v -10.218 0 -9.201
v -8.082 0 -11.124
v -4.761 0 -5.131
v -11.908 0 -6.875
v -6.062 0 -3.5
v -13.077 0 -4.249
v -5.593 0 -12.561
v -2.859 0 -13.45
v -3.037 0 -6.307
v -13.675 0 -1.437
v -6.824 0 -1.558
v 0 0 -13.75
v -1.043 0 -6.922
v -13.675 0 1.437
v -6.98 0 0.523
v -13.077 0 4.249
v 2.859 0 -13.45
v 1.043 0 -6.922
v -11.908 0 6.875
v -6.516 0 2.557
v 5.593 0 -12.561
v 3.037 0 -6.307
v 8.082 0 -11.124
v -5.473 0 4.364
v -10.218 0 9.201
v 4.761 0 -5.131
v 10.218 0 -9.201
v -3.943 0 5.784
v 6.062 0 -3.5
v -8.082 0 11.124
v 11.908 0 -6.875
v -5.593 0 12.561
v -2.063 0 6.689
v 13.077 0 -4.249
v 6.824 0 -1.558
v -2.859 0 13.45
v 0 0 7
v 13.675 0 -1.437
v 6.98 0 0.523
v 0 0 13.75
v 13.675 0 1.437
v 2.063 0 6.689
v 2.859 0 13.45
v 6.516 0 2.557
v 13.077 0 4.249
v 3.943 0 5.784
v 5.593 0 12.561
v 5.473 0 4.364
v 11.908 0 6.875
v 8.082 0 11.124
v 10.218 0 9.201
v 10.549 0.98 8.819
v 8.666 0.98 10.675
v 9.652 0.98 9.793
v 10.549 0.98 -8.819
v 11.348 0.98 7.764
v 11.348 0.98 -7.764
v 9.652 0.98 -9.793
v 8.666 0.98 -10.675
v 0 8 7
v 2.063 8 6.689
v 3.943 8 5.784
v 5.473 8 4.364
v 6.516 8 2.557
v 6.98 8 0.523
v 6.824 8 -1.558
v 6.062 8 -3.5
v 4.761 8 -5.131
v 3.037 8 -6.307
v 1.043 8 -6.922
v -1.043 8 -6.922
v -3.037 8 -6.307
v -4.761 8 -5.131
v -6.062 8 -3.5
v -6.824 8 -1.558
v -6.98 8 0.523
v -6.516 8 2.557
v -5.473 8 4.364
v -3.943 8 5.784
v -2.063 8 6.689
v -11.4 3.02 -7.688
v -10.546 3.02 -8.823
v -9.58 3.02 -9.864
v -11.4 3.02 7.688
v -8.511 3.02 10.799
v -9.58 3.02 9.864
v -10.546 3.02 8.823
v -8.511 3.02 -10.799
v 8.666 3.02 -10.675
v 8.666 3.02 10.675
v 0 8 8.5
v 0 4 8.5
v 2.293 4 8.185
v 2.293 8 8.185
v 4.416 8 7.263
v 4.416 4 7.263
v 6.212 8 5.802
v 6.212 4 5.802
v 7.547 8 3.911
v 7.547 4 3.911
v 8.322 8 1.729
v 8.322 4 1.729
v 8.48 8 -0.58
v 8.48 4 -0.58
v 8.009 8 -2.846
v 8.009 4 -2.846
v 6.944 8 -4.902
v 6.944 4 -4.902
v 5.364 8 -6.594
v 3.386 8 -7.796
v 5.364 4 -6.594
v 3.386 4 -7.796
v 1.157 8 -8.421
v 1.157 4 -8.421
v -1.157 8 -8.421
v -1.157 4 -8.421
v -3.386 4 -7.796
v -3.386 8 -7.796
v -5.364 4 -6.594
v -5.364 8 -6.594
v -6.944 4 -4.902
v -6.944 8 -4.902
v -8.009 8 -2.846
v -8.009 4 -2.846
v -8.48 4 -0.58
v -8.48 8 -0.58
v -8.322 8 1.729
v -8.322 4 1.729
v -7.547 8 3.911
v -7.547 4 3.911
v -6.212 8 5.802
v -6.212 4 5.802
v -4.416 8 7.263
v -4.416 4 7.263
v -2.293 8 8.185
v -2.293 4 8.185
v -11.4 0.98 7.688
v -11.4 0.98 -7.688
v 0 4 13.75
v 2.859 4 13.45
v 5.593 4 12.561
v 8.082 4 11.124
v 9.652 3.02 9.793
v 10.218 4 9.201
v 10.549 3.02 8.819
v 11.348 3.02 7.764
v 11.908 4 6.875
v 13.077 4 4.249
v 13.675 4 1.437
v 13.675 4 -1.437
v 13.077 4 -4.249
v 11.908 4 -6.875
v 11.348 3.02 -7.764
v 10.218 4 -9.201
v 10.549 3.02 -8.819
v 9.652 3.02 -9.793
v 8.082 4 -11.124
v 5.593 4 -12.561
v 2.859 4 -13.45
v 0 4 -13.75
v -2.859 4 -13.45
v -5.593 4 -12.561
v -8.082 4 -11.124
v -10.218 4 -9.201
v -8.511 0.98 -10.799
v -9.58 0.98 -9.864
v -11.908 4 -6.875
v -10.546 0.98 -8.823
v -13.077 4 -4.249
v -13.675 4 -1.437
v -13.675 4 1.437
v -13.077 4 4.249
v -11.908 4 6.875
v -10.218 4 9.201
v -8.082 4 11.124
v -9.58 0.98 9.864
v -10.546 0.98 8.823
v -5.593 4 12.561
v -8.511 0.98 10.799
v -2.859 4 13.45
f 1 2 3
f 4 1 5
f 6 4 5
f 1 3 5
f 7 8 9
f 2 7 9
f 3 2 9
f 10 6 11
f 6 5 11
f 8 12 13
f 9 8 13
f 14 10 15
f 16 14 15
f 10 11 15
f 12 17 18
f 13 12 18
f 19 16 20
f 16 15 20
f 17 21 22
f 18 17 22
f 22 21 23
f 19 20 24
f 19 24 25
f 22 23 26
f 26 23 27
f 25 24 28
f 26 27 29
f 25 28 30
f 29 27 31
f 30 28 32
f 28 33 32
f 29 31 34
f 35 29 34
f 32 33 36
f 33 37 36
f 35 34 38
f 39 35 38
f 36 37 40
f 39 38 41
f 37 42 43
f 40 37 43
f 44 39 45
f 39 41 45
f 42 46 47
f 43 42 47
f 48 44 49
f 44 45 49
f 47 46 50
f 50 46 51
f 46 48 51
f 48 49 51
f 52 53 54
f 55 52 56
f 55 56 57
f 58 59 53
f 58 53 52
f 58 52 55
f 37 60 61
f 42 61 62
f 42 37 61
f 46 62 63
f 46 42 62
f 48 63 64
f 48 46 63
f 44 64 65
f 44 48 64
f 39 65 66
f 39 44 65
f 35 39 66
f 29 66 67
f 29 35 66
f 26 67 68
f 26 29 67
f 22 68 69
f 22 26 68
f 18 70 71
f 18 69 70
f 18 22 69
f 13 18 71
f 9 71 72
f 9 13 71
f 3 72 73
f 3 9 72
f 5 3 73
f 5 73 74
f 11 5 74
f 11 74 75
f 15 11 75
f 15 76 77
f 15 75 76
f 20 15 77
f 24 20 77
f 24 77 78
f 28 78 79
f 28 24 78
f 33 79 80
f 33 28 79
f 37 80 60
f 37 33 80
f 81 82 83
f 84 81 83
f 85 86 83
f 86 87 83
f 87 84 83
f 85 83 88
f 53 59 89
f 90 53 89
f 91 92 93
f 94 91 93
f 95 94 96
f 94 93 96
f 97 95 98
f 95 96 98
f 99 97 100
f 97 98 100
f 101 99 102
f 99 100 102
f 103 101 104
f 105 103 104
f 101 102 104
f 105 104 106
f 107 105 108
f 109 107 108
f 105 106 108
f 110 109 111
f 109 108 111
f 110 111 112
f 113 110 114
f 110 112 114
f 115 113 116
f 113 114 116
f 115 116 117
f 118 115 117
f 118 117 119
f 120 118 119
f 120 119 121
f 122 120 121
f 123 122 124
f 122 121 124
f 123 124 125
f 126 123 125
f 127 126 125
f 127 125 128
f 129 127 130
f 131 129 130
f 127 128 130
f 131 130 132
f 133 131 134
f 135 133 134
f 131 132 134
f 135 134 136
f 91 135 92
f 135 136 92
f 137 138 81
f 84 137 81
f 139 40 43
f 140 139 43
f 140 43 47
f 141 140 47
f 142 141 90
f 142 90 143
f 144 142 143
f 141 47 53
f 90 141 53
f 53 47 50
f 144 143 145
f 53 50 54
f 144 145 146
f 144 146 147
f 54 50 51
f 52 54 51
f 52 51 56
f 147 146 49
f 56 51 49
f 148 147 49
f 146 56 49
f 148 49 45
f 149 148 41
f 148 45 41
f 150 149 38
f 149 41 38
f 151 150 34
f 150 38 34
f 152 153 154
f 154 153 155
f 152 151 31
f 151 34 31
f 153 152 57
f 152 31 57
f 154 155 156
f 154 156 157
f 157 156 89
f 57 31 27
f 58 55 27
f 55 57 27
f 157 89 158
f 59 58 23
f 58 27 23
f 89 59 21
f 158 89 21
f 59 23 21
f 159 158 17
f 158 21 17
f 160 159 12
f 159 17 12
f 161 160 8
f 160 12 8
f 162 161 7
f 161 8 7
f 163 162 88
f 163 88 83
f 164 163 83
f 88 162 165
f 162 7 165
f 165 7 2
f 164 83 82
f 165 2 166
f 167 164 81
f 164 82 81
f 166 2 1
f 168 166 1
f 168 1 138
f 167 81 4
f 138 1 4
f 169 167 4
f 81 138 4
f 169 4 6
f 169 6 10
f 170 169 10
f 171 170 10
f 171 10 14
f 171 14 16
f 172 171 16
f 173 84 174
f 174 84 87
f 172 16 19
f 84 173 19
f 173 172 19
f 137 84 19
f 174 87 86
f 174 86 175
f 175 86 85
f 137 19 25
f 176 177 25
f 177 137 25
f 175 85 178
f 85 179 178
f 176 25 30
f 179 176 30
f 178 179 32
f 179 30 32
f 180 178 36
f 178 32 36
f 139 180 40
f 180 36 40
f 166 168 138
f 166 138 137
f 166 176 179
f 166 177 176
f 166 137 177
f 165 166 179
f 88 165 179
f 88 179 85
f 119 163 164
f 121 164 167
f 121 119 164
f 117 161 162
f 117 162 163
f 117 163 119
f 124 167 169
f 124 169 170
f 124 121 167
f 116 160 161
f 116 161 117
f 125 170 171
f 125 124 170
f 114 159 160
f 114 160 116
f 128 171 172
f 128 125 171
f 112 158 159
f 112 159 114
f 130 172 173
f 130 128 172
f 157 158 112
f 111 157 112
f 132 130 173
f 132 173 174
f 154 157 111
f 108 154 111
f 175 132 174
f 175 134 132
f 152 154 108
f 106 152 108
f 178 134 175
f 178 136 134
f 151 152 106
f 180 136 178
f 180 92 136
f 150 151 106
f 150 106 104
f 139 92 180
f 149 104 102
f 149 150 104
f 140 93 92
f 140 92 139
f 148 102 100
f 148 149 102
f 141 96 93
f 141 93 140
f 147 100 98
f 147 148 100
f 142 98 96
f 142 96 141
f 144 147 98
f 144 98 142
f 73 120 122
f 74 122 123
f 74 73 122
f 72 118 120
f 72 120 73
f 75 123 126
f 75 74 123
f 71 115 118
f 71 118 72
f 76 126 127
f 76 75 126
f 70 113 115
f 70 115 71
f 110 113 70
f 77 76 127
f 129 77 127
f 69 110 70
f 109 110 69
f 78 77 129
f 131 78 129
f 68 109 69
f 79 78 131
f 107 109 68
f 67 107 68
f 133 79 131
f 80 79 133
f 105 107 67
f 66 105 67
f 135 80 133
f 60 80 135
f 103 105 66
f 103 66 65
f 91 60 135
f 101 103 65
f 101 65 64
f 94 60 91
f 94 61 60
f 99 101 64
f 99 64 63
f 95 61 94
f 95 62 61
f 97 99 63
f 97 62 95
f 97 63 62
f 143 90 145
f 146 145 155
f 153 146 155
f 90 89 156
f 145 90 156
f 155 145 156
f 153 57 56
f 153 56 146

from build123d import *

# Parameters (mm, degrees)
SKETCH1_R               = 13.75
BOSS_EXTRUDE1_DEPTH     = 4
BOSS_EXTRUDE2_START     = 4
SKETCH5_R               = 8.5
BOSS_EXTRUDE2_DEPTH     = 4
CUT_EXTRUDE1_DEPTH      = 22.026768653
CUT_EXTRUDE1_DEPTH_BACK = 22.026768653
SKETCH6_W               = 2.888681075
SKETCH6_H               = 2.039823556
SKETCH6_W_2             = 2.682346713
SKETCH8_R               = 7
CUT_EXTRUDE3_DEPTH      = 12


with BuildPart() as part:
    # Sketch1 → Boss-Extrude1 (new body)
    with BuildSketch(Plane(origin=(0, 0, 0), x_dir=(1, 0, 0), z_dir=(0, 1, 0))):
        with Locations(Location((0, 0, 0), (0, 0, 270))):
            Circle(SKETCH1_R)
    extrude(amount=BOSS_EXTRUDE1_DEPTH)

    # Sketch5 → Boss-Extrude2 (add)
    with BuildSketch(Plane(origin=(0, 0, 0), x_dir=(1, 0, 0), z_dir=(0, 1, 0)).offset(BOSS_EXTRUDE2_START)):
        with Locations(Location((0, 0, 0), (0, 0, 270))):
            Circle(SKETCH5_R)
    extrude(amount=BOSS_EXTRUDE2_DEPTH)

    # Sketch6 → Cut-Extrude1 (cut, two sides: drawn at the far end of the back side and taken through both)
    with BuildSketch(Plane.XY.offset(-CUT_EXTRUDE1_DEPTH_BACK)):
        with Locations((-9.95563299, 2)):
            Rectangle(SKETCH6_W, SKETCH6_H)
        with Locations((10.007216581, 2)):
            Rectangle(SKETCH6_W_2, SKETCH6_H)
    extrude(amount=CUT_EXTRUDE1_DEPTH + CUT_EXTRUDE1_DEPTH_BACK, mode=Mode.SUBTRACT)

    # Sketch8 → Cut-Extrude3 (cut)
    with BuildSketch(Plane(origin=(0, 0, 0), x_dir=(1, 0, 0), z_dir=(0, 1, 0))):
        with Locations(Location((0, 0, 0), (0, 0, 270))):
            Circle(SKETCH8_R)
    extrude(amount=CUT_EXTRUDE3_DEPTH, mode=Mode.SUBTRACT)


solid = part.part
